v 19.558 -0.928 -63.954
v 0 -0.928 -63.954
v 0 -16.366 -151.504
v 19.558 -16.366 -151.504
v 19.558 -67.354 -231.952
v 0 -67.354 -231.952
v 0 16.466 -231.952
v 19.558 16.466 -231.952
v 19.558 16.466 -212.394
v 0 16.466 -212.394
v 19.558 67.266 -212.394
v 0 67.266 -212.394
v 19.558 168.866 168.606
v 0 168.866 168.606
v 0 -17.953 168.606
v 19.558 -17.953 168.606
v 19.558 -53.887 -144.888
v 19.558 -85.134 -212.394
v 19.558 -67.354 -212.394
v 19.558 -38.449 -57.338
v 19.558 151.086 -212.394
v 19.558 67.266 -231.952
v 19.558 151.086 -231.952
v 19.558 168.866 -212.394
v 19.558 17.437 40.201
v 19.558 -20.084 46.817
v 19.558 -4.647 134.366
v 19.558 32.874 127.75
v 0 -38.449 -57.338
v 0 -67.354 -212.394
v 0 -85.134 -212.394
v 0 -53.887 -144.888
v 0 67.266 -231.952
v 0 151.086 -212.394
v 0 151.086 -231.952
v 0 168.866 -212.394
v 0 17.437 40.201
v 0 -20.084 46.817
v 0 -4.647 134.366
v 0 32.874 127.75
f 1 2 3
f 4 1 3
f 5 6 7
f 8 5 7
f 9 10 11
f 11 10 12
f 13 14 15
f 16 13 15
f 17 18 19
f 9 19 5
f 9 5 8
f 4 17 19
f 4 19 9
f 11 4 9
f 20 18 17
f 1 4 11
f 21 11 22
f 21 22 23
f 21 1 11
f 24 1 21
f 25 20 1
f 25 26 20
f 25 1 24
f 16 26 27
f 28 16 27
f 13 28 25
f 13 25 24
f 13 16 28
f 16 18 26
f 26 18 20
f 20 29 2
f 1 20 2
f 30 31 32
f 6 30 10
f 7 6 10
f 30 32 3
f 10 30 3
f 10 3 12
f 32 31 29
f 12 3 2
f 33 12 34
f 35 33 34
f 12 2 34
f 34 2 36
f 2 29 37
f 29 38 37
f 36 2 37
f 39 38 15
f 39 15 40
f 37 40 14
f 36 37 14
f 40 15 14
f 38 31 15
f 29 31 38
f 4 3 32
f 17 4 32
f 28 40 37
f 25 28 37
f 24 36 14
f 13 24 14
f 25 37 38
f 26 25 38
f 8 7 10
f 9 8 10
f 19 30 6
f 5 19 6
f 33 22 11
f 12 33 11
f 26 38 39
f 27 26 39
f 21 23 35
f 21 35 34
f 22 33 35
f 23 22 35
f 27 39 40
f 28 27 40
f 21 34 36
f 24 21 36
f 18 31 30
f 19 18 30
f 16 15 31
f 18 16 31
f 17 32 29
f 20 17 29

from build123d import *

# Parameters (mm, degrees)
F0_W     = 83.82
F0_H     = 19.558
F1_DEPTH = 19.558


with BuildPart() as f1:
    # F0 (on Right) → F1 (new body)
    with BuildSketch(Plane.YZ):
        Polygon((-17.953301, 168.605641), (-85.133881, -212.394359), (-67.353881, -212.394359), (-17.953301, -212.394359), (16.466119, -212.394359), (67.266119, -212.394359), (151.086119, -212.394359), (168.866119, -212.394359), (168.866119, 168.605641), align=None)
        Polygon((-0.928284, -63.954421), (-16.365607, -151.50383), (-53.886782, -144.887834), (-38.449459, -57.338425), align=None, mode=Mode.SUBTRACT)
        Polygon((32.874382, 127.750025), (17.437059, 40.200616), (-20.084116, 46.816611), (-4.646793, 134.366021), align=None, mode=Mode.SUBTRACT)
        Polygon((-17.953301, -212.394359), (-67.353881, -212.394359), (-67.353881, -231.952359), (16.466119, -231.952359), (16.466119, -212.394359), align=None)
        with Locations((109.176119, -222.173359)):
            Rectangle(F0_W, F0_H)
    extrude(amount=F1_DEPTH)


solid = f1.part
